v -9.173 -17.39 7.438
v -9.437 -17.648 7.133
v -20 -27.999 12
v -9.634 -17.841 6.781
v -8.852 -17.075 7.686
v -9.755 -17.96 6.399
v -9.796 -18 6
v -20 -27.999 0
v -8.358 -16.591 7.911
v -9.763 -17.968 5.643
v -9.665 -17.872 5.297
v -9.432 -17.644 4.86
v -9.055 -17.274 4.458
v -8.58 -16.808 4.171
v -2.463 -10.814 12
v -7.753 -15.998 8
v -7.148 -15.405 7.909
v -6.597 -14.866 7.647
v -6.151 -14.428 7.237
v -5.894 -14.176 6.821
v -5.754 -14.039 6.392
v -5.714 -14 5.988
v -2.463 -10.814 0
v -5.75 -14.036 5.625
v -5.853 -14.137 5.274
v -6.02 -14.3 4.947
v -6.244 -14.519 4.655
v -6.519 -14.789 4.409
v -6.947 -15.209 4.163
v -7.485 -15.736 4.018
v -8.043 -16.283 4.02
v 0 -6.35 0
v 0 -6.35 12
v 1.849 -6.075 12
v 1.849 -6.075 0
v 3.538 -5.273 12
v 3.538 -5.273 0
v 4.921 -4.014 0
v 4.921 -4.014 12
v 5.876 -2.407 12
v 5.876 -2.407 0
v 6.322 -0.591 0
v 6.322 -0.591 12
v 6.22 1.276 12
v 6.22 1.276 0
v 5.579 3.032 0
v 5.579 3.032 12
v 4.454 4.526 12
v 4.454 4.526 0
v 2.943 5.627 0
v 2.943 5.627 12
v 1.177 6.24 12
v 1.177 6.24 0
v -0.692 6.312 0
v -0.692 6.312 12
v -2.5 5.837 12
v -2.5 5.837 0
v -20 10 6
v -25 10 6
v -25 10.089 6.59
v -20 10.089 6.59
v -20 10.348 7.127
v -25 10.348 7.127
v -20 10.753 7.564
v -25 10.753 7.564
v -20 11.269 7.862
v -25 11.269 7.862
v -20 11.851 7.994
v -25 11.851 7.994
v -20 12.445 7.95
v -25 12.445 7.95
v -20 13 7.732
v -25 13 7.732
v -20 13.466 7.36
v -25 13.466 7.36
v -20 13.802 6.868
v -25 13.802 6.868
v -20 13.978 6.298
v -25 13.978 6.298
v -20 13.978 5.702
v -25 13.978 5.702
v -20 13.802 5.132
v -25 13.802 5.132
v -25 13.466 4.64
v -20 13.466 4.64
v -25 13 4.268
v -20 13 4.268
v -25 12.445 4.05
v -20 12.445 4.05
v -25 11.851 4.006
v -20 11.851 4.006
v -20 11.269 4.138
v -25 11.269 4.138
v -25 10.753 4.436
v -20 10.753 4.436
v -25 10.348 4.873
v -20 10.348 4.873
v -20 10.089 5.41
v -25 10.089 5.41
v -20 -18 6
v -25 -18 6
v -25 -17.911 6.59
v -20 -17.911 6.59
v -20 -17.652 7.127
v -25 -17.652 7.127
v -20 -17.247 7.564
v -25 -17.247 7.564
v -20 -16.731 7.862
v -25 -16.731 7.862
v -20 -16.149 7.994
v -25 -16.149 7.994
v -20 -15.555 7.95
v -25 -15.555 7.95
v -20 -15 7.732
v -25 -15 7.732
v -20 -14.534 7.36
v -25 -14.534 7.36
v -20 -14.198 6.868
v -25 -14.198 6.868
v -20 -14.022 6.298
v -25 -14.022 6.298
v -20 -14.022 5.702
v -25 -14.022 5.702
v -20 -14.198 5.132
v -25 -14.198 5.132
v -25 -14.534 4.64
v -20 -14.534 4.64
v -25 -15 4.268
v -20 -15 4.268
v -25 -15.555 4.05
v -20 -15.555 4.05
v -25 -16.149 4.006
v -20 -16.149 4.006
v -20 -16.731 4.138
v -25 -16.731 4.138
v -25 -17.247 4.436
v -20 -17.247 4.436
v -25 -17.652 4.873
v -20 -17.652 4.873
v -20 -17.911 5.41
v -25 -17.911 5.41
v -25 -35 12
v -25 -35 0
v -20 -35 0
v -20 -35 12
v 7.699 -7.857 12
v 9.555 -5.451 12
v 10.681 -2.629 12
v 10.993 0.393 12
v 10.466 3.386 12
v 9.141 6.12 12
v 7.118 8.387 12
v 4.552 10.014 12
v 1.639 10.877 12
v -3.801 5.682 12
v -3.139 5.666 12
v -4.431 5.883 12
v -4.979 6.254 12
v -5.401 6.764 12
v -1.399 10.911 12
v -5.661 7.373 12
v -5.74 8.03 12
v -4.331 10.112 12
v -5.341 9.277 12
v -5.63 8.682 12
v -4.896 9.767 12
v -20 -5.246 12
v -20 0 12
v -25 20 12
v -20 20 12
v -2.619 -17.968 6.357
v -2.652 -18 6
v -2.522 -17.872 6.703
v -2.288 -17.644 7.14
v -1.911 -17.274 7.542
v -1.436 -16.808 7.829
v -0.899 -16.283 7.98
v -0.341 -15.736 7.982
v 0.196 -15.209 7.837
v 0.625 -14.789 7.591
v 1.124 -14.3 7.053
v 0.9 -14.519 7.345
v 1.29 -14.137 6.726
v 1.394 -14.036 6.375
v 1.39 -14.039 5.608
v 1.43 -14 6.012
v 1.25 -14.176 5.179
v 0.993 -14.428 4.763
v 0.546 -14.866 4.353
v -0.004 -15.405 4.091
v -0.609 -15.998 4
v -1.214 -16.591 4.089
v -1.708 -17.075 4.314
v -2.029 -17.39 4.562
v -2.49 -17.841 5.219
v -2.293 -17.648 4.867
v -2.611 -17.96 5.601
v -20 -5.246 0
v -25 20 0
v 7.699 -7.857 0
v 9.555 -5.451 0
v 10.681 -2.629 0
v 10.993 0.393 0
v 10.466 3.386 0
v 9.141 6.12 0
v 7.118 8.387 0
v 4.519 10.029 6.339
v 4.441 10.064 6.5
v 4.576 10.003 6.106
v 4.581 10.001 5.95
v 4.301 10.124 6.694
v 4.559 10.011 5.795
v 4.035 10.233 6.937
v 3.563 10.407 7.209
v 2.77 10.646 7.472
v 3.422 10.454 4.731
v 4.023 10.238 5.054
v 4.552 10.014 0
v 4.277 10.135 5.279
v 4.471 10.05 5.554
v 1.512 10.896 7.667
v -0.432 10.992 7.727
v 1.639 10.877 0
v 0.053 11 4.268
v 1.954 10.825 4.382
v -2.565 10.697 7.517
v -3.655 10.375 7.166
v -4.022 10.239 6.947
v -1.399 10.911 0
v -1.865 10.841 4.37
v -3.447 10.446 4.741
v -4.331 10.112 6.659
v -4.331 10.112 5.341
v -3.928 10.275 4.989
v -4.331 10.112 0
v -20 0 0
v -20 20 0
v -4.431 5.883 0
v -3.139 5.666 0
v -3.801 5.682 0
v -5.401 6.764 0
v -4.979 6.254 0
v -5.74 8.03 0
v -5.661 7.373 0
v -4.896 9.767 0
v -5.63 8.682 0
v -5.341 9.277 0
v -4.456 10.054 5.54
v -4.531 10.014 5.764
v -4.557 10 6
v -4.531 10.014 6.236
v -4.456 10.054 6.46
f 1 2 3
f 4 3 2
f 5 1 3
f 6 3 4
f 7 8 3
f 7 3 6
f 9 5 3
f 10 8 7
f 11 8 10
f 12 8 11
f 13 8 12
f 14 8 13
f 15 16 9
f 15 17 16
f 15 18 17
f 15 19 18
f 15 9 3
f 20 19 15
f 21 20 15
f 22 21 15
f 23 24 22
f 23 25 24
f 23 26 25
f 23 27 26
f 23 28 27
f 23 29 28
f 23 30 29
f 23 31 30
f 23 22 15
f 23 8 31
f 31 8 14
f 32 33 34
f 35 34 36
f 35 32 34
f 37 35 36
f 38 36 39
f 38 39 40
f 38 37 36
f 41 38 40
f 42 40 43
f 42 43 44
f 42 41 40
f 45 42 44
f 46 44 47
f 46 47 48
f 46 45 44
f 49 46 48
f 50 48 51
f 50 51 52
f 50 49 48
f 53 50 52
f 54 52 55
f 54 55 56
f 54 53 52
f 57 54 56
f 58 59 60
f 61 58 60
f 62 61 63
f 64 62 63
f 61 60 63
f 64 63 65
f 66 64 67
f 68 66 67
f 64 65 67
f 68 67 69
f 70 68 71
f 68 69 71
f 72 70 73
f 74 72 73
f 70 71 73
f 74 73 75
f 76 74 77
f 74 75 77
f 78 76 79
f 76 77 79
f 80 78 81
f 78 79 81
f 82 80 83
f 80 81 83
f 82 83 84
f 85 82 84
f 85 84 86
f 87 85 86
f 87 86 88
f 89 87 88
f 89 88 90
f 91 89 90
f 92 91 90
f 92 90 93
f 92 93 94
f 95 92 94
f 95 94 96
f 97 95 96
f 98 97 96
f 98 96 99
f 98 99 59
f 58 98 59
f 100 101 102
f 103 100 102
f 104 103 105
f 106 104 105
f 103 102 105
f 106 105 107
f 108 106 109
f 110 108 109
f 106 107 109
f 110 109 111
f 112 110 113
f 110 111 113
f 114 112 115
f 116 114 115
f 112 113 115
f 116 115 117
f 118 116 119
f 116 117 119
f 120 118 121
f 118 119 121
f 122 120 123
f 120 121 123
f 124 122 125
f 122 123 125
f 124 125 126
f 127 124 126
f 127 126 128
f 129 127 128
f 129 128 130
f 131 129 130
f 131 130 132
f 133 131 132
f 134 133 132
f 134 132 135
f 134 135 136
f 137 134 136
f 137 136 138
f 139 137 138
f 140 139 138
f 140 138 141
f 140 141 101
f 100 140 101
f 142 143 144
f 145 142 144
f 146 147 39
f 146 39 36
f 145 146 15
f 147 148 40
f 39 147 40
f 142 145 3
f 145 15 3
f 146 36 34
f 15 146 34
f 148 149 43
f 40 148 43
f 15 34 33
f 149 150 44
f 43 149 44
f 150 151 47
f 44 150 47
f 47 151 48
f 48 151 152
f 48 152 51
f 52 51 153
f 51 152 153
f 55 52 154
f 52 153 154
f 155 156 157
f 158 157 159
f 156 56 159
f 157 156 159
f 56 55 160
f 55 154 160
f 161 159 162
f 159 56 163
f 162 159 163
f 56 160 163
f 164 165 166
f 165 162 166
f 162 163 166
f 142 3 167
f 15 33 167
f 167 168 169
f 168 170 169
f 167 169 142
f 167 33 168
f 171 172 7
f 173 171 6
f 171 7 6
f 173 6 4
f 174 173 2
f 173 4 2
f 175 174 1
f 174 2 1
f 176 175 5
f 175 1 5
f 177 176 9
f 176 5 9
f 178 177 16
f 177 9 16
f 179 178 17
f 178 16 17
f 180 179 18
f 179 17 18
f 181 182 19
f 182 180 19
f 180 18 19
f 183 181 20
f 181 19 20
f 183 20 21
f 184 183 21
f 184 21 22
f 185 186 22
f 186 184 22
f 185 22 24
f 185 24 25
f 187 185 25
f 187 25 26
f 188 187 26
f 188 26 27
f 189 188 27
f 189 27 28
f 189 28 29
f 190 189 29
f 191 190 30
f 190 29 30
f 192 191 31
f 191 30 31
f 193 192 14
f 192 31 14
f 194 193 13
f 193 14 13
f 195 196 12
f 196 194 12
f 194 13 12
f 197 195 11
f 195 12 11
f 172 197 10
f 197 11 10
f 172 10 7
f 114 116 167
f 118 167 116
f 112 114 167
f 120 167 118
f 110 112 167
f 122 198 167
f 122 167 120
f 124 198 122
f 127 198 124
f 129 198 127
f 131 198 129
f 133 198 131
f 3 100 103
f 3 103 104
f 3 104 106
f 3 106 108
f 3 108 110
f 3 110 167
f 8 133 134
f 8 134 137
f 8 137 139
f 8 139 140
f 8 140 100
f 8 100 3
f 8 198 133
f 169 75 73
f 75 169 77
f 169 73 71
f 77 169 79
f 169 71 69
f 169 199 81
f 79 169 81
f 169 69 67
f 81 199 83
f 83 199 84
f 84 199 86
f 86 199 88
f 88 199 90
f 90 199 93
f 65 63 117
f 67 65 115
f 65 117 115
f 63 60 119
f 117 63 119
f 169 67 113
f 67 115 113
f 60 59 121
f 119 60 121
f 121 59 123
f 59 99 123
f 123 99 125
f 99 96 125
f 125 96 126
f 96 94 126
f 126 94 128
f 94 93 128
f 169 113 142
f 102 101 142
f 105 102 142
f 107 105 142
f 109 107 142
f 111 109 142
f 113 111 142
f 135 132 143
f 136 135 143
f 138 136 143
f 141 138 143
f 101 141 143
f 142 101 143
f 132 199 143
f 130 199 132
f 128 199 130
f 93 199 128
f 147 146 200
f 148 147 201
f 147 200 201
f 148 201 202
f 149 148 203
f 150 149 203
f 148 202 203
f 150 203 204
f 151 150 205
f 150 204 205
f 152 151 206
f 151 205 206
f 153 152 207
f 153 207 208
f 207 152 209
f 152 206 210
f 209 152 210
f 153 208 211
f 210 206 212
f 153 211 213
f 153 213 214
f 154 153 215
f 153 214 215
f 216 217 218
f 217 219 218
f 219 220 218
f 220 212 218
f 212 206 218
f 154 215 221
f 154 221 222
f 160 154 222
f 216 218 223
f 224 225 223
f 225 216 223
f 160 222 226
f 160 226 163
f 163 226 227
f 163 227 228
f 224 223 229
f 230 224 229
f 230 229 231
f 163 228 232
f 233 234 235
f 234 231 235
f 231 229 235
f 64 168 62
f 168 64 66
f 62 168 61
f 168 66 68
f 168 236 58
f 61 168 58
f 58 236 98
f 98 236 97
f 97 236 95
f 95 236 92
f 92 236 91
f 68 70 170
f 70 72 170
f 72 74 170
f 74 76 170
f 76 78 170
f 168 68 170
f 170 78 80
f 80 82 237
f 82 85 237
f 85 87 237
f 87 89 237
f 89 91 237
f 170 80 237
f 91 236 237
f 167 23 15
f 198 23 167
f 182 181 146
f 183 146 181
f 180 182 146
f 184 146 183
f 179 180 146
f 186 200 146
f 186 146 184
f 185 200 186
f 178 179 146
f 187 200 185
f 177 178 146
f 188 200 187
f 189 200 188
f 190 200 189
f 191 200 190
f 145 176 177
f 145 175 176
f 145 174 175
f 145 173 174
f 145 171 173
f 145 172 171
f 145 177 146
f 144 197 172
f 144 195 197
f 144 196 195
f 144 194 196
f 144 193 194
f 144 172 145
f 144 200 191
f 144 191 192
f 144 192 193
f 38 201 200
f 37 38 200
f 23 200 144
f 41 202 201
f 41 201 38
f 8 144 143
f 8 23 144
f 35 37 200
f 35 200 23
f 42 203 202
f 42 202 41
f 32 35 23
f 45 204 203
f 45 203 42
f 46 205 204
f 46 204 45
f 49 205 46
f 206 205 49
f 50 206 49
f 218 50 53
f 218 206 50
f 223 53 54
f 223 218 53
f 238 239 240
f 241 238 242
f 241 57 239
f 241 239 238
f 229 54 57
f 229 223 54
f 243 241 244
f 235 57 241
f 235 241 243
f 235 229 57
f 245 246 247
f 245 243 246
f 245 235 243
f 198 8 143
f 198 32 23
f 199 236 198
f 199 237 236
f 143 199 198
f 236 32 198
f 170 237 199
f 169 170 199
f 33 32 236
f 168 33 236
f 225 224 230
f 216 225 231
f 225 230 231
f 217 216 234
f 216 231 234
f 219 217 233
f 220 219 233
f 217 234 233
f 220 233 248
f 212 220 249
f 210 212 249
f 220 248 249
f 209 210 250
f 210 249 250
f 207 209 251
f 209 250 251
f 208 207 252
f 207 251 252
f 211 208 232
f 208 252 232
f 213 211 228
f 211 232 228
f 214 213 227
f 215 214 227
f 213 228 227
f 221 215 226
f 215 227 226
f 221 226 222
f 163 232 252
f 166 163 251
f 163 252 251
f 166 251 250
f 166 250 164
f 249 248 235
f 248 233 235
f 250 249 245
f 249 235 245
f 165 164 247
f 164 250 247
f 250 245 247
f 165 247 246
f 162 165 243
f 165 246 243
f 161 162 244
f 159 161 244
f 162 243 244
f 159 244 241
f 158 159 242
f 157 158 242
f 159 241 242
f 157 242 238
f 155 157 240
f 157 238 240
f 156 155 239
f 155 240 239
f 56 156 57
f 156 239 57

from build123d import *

# Parameters (mm, degrees)
PAD_DEPTH    = 12
SKETCH002_R  = 2
POCKET_DEPTH = 36.001


with BuildPart() as part:
    # Sketch001 → Pad (new body)
    with BuildSketch(Plane.XY):
        with BuildLine():
            ThreePointArc((0, -6.35), (6.22047, 1.276029), (-2.5, 5.837165))
            ThreePointArc((-4.330691, 10.111633), (-5.552574, 7.059055), (-2.5, 5.837165))
            ThreePointArc((7.698987, -7.856564), (9.14059, 6.11961), (-4.330691, 10.111633))
            Line((7.698987, -7.856564), (-20, -35))
            Line((-25, -35), (-20, -35))
            Line((-25, 20), (-25, -35))
            Line((-20, 20), (-25, 20))
            Line((-20, 0), (-20, 20))
            Line((0, -6.35), (-20, 0))
        make_face()
        Polygon((-20, -5.245966), (-20, -27.999484), (-2.462803, -10.814026), align=None, mode=Mode.SUBTRACT)
    extrude(amount=PAD_DEPTH)

    # Sketch002 → Pocket (cut, through all)
    with BuildSketch(Plane(origin=(-25, 0, 0), x_dir=(0, -1, 0), z_dir=(-1, 0, 0))):
        with Locations((-12, 6)):
            Circle(SKETCH002_R)
        with Locations((16, 6)):
            Circle(SKETCH002_R)
    extrude(amount=-POCKET_DEPTH, mode=Mode.SUBTRACT)


solid = part.part
